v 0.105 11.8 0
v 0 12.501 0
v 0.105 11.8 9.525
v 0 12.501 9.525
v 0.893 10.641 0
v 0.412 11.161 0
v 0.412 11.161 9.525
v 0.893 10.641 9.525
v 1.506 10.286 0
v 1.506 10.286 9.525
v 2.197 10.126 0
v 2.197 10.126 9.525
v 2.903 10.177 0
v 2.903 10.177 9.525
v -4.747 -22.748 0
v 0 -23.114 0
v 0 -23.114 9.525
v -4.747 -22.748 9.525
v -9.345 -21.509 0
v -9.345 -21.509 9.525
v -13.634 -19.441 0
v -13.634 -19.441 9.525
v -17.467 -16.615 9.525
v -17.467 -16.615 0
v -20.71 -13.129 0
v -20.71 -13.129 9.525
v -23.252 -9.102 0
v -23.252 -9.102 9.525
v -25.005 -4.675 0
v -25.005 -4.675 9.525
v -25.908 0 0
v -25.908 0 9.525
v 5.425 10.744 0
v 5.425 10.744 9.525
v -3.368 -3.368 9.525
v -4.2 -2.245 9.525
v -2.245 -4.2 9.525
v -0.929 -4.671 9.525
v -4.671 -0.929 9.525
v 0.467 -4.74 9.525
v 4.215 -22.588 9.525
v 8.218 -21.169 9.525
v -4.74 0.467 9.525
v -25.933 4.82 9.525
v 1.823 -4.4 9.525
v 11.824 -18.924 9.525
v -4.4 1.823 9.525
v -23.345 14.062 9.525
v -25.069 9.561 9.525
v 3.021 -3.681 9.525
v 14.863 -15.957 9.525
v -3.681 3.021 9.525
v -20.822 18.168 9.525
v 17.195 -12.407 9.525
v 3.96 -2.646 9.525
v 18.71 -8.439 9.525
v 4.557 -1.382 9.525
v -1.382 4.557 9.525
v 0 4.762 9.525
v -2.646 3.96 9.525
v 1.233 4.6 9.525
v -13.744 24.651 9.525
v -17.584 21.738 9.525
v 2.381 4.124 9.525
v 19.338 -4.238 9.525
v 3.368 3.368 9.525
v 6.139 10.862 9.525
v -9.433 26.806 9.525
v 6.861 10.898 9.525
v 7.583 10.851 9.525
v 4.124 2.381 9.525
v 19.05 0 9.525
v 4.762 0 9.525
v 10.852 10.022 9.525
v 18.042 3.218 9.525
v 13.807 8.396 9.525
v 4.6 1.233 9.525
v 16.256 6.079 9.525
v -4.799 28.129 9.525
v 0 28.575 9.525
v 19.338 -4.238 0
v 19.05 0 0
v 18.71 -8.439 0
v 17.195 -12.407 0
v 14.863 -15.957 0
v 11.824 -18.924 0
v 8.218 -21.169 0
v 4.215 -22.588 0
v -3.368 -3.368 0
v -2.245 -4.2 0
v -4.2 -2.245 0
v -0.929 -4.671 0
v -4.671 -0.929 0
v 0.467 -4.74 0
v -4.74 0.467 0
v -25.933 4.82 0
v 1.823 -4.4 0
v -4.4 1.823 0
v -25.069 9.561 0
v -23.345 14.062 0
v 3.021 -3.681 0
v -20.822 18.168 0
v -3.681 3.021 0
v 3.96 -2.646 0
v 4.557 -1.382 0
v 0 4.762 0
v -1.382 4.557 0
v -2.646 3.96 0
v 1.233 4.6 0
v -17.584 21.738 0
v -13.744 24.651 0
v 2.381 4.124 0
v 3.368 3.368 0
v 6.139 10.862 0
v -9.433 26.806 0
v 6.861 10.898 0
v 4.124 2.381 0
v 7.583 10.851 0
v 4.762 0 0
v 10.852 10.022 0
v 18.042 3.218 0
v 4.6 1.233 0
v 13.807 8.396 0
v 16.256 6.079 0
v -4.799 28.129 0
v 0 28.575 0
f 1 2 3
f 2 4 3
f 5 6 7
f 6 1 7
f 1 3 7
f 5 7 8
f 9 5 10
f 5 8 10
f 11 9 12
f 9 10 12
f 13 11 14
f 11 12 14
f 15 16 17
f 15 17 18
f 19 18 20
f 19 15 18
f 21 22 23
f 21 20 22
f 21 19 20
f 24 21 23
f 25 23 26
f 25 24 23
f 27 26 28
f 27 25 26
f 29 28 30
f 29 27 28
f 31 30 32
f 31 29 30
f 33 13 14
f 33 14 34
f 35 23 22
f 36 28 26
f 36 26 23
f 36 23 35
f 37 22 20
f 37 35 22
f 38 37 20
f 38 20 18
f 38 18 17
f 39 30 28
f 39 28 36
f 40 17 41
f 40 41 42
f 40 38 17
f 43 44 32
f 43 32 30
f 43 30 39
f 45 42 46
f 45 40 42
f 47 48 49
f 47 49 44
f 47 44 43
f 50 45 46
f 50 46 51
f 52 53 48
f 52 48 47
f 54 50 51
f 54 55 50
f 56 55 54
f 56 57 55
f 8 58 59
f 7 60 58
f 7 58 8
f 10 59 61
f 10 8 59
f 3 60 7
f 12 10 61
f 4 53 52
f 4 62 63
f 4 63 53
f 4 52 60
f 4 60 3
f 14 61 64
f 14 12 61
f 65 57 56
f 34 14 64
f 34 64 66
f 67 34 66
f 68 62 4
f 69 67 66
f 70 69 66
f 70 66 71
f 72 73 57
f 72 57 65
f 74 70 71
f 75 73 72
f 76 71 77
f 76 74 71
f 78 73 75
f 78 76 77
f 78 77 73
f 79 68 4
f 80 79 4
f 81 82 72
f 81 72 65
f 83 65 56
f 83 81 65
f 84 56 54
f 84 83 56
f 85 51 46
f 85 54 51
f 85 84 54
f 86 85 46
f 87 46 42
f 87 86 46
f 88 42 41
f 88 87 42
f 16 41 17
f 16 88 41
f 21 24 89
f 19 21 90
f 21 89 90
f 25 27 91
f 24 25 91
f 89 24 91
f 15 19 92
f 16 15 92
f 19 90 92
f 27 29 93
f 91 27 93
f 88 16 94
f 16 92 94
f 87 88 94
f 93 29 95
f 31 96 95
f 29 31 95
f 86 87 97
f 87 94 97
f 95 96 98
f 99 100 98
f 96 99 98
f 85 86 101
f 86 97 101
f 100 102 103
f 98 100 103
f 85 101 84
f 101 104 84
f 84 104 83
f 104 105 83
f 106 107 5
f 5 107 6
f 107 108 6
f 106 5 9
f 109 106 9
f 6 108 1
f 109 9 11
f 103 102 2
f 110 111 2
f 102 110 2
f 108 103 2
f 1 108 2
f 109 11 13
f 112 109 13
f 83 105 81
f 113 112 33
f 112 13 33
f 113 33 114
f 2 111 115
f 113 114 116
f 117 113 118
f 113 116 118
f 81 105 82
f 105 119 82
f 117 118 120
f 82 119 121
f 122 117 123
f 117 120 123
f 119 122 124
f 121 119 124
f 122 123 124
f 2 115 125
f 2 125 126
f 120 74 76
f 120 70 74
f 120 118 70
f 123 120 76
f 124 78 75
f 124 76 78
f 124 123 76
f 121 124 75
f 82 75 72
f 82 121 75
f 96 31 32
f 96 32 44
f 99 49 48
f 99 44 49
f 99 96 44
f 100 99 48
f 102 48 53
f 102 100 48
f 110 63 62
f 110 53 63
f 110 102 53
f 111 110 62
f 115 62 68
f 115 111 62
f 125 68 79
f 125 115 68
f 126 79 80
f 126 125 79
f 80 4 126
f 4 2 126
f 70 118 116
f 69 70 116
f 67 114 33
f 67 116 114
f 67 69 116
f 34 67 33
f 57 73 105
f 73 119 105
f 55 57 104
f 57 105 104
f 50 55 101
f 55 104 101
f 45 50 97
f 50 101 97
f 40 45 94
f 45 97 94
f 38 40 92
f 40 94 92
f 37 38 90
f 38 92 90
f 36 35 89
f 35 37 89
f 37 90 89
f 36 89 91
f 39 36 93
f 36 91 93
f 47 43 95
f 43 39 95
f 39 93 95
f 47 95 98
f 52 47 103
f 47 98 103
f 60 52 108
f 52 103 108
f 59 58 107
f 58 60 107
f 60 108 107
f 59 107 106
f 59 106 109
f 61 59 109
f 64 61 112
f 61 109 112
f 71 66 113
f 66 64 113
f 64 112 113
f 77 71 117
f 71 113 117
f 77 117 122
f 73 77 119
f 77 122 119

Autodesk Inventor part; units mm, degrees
ref_plane "YZ Plane" through (0, 0, 0) normal (1, 0, 0) x (0, 1, 0)
ref_plane "XZ Plane" through (0, 0, 0) normal (0, 1, 0) x (-1, 0, 0)
ref_plane "XY Plane" through (0, 0, 0) normal (0, 0, 1) x (1, 0, 0)
sketch "Sketch1" plane through (0, 0, 0) normal (1, 0, 0) x (0, 1, 0)
  circle A0 centre (0, 0) radius 9.525
  circle A1 centre (0, 0) radius 28.575
  circle A2 centre (0, 0) radius 4.7625
  circle A3 centre (15.875, 41.275) radius 4.7625
  line L0 (15.875, 41.275) -> (27.6665, 7.4435)
  line L1 (-19.9525, 92.075) -> (-19.9525, 41.275)
  circle A4 centre (15.875, 41.275) radius 35.8275
  line L2 (15.875, 41.275) -> (6.87, 6.5977)
  line L3 (0, 0) -> (0, 75.4256) construction
  line L4 (15.875, 41.275) -> (-18.4298, 139.7)
  line L5 (-26.3025, 92.075) -> (-26.3025, 41.275)
  line L6 (-26.3025, 41.275) -> (-13.6025, 41.275)
  line L7 (-13.6025, 41.275) -> (-13.6025, 92.075)
  line L8 (-13.6025, 92.075) -> (-26.3025, 92.075)
  line L9 (-26.3025, 92.075) -> (-13.6025, 41.275) construction
  line L10 (-26.3025, 41.275) -> (-13.6025, 92.075) construction
  point P0 (-19.9525, 66.675)
  dimension "d0" = 19.05
  dimension "d1" = 19.05
  dimension "d2" = 9.525
  dimension "d3" = 9.525
  dimension "d4" = 15.875
  dimension "d5" = 41.275
  dimension "d6" = 33.772
  dimension "d7" = 50.8
  dimension "d8" = 139.7
  dimension "d9" = 12.7
sketch "Sketch4" plane through (0, 0, 0) normal (0, 0, 1) x (1, 0, 0)
  circle A0 centre (0, 0) radius 9.525
  circle A1 centre (0, 0) radius 4.7625
  circle A2 centre (0, 0) radius 28.575 construction
  line L0 (0, 0) -> (0, 28.575)
  line L1 (0, 0) -> (28.575, 0) construction
  line L2 (0, 0) -> (-28.575, 0) construction
  line L3 (0, 0) -> (0, -28.575) construction
  circle A3 centre (0, 0) radius 19.05 construction
  circle A4 centre (0, 0) radius 23.114 construction
  circle A5 centre (0, 0) radius 25.908 construction
  arc A6 (19.05, 0) -> (0, 9.525) centre (5.9807, -2.3261) ccw
  arc A7 (0, -23.114) -> (19.05, 0) centre (-0.3155, -3.4467) ccw
  arc A8 (-25.908, 0) -> (0, -23.114) centre (-0.411, 2.5022) ccw
  arc A9 (0, 28.575) -> (-25.908, 0) centre (0, 2.5425) ccw
  line L4 (0, 0) -> (9.525, 16.4978) construction
  line L5 (0, 0) -> (19.05, 0) construction
  line L6 (0, 9.525) -> (6.3187, 10.9443)
  dimension "d61" = 19.05
  dimension "d65" = 46.228
  dimension "d66" = 51.816
  dimension "d62" = 9.525
  dimension "d63" = 19.05
  dimension "d64" = 38.1
  dimension "d68" = 30
extrude "Extrusion3" add sketch "Sketch4" along normal blind 9.525 contours A0 | L6 A6 A7 A8 A9 L0
fillet "Fillet1" radius 6.35 1 edges at (6.3187, 10.9443, 4.7625)
fillet "Fillet2" radius 2.3813 1 edges at (0, 9.525, 4.7625)
sketch "Sketch5" plane through (0, 0, 0) normal (0, 0, -1) x (-1, 0, 0)
  line L0 (0, 12.5005) -> (0, 28.575) projected
  circle A0 centre (0, 0) radius 28.575
  dimension "d73" = 57.15
properties part number "Snail Cam"
